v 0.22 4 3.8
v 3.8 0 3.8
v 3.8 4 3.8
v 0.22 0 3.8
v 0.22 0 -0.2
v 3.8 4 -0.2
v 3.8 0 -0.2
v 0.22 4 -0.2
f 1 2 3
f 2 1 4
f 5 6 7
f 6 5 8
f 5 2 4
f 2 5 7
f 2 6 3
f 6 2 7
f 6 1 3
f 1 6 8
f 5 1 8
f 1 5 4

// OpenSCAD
translate([0.22, 0, -0.2]) {
    cube([3.58,4,4], false);
}
